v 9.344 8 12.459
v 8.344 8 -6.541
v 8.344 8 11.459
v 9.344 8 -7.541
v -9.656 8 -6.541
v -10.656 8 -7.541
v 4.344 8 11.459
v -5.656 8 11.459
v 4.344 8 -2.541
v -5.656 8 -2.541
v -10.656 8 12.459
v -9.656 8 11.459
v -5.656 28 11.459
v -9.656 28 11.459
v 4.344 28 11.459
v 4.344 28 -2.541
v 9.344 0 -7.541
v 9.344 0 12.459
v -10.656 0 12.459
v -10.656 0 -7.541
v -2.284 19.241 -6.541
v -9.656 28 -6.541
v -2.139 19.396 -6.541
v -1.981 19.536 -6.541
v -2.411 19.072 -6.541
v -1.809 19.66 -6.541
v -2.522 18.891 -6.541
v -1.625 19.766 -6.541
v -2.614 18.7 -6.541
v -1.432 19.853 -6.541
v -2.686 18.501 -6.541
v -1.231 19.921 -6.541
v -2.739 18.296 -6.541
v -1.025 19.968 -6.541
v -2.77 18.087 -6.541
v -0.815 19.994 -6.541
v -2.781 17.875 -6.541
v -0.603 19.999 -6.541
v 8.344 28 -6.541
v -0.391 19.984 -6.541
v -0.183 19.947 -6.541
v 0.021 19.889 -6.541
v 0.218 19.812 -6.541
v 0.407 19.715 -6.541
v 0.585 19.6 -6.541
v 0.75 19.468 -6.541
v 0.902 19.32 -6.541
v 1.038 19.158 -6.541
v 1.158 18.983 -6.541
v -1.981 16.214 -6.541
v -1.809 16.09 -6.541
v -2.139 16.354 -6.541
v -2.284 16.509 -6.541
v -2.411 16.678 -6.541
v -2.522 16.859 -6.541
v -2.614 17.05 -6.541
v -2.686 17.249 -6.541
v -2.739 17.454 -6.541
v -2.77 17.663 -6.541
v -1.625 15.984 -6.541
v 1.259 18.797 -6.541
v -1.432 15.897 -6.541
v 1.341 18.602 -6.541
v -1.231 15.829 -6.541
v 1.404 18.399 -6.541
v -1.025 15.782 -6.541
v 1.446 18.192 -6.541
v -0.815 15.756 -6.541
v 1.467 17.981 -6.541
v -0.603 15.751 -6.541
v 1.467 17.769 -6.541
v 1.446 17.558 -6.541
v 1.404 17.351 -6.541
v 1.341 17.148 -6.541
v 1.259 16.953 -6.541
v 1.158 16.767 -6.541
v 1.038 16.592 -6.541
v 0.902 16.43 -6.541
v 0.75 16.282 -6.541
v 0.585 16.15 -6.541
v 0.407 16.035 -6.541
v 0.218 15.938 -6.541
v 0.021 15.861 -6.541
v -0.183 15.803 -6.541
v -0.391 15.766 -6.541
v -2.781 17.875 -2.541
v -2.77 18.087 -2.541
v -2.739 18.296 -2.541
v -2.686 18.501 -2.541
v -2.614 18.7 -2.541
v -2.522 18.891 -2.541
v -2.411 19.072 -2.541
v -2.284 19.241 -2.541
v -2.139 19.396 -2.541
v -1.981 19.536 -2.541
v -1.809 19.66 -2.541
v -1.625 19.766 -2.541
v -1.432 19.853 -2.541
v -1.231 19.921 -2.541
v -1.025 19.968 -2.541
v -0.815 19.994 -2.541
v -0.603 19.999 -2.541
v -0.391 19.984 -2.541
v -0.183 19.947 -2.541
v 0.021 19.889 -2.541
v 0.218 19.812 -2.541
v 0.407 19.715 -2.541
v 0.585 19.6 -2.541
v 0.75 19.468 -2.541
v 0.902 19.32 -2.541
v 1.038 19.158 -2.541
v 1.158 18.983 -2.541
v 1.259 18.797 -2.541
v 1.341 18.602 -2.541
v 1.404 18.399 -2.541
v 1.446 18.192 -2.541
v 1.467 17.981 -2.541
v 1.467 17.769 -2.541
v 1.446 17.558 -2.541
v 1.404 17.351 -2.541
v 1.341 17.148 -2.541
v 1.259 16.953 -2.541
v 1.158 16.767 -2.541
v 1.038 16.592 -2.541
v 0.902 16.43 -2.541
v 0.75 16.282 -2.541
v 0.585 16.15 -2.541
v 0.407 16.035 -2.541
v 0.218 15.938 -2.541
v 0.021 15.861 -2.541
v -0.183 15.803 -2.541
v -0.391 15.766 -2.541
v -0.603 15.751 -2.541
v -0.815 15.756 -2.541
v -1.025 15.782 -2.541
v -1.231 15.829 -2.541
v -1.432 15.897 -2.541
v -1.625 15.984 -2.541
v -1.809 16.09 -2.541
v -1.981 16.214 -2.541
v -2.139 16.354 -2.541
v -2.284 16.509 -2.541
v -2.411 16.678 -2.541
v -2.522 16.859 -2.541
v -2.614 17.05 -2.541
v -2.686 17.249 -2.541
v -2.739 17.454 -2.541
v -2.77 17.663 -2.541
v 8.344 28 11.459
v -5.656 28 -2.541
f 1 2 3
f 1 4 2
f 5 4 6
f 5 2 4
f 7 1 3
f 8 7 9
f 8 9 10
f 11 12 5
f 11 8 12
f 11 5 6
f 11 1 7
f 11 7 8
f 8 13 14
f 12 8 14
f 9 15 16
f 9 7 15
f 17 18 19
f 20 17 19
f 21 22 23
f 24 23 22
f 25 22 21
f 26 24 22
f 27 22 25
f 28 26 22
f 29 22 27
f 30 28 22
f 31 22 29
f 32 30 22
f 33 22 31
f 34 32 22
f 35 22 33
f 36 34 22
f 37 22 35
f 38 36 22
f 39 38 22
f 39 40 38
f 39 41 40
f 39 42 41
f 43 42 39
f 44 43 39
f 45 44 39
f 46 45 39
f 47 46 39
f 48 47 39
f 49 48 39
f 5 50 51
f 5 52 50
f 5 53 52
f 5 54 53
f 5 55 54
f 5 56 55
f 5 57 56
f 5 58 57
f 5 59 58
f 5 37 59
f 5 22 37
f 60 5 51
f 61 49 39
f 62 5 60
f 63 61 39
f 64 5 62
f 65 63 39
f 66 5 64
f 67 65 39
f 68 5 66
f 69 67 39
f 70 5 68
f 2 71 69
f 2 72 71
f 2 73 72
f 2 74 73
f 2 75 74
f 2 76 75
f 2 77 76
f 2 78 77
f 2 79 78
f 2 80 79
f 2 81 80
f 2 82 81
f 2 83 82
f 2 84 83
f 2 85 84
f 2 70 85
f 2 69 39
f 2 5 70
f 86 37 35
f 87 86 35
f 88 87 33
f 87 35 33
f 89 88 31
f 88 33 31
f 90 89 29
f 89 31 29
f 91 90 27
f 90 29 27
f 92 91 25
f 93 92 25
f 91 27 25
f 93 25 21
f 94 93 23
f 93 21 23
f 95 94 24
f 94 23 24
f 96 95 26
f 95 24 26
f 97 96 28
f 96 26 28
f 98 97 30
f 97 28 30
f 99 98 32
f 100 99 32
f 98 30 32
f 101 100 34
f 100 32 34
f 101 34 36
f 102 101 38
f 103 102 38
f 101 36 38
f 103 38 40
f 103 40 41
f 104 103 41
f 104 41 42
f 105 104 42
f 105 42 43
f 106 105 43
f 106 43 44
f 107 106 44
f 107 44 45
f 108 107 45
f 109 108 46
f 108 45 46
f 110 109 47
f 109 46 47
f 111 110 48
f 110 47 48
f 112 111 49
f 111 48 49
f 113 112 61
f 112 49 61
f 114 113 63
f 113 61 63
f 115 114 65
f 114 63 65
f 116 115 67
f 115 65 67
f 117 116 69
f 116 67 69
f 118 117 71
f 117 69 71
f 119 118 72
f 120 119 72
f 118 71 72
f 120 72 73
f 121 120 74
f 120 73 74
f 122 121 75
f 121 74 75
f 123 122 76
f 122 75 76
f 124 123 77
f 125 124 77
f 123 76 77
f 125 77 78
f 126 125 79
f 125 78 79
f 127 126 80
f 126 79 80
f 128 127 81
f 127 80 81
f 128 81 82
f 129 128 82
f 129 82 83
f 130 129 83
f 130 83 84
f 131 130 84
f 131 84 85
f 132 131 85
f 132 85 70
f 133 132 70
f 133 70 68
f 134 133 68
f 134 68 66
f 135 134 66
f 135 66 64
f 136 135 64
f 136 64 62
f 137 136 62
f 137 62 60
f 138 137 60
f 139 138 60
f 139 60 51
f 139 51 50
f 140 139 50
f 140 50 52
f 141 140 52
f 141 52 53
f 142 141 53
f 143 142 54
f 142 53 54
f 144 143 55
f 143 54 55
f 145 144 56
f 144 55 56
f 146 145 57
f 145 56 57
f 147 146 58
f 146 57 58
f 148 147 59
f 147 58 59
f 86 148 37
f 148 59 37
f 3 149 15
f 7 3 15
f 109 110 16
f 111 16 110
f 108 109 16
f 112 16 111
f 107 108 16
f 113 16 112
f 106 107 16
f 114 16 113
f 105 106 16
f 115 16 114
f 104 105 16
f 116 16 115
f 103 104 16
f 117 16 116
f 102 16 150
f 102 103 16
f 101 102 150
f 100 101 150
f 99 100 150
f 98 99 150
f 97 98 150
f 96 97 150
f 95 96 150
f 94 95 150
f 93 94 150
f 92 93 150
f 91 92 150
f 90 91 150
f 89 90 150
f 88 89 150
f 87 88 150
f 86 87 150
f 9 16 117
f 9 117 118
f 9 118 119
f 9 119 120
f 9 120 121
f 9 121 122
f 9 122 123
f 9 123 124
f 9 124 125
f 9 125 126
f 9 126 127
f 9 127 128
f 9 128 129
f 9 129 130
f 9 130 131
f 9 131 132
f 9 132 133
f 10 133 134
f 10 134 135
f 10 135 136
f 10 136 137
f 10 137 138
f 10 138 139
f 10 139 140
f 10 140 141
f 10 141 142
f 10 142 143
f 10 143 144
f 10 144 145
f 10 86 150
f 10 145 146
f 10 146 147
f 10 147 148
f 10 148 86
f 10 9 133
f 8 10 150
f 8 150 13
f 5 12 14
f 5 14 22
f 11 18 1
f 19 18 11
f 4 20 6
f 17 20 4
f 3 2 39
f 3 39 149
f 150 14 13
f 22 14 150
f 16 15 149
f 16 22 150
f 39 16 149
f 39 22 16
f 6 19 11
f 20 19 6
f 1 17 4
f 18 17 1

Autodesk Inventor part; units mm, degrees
ref_plane "YZ Plane" through (0, 0, 0) normal (1, 0, 0) x (0, 1, 0)
ref_plane "XZ Plane" through (0, 0, 0) normal (0, 1, 0) x (-1, 0, 0)
ref_plane "XY Plane" through (0, 0, 0) normal (0, 0, 1) x (1, 0, 0)
sketch "Sketch2" plane through (0, 0, 0) normal (0, 1, 0) x (-1, 0, 0)
  line L0 (10.6557, -7.541) -> (-9.3443, -7.541)
  line L1 (-9.3443, -7.541) -> (-9.3443, 12.459)
  line L2 (-9.3443, 12.459) -> (10.6557, 12.459)
  line L3 (10.6557, 12.459) -> (10.6557, -7.541)
  point P0 (0, 0)
  dimension "d10" = 20
  dimension "d11" = 20
extrude "Extrusion3" add sketch "Sketch2" along normal blind 8
sketch "Sketch3" plane through (0, 8, 0) normal (0, 1, 0) x (1, 0, 0)
  line L0 (9.3443, 7.541) -> (-10.6557, 7.541) projected
  line L1 (-10.6557, 7.541) -> (-10.6557, -12.459) projected
  line L2 (-10.6557, -12.459) -> (9.3443, -12.459) projected
  line L3 (9.3443, -12.459) -> (9.3443, 7.541) projected
  line L4 (-9.6557, -11.459) -> (-9.6557, 6.541)
  line L5 (-9.6557, 6.541) -> (8.3443, 6.541)
  line L6 (8.3443, 6.541) -> (8.3443, -11.459)
  line L7 (8.3443, -11.459) -> (4.3443, -11.459)
  line L8 (4.3443, -11.459) -> (4.3443, 2.541)
  line L9 (4.3443, 2.541) -> (-5.6557, 2.541)
  line L10 (-5.6557, 2.541) -> (-5.6557, -11.459)
  line L11 (-5.6557, -11.459) -> (-9.6557, -11.459)
  line L12 (-9.6557, 6.541) -> (-10.6557, 6.541) construction
  line L13 (8.3443, 6.541) -> (9.3443, 6.541) construction
  line L14 (-9.6557, 6.541) -> (-9.6557, 7.541) construction
  point P0 (0, 0)
  dimension "d14" = 10
  dimension "d15" = 4
  dimension "d16" = 4
  dimension "d17" = 1
  dimension "d18" = 14
extrude "Extrusion4" add sketch "Sketch3" along normal blind 20 contours L4 L5 L6 L7 L8 L9 L10 L11
sketch "Sketch4" plane through (8.3443, 8, -6.541) normal (0, 0, -1) x (-1, 0, 0)
  circle A0 centre (9, 9.875) radius 2.125
  line L0 (9, 9.875) -> (0, 9.875) construction
  line L1 (0, 0) -> (0, 20) projected
  line L2 (9, 9.875) -> (18, 9.875) construction
  line L3 (18, 0) -> (18, 20) projected
  line L4 (0, 20) -> (18, 20) projected
  point P0 (8.3443, -8)
  dimension "d21" = 4.25
  dimension "d22" = 8
extrude "Extrusion5" cut sketch "Sketch4" against normal up to next
properties part number "XPulleySupport"
